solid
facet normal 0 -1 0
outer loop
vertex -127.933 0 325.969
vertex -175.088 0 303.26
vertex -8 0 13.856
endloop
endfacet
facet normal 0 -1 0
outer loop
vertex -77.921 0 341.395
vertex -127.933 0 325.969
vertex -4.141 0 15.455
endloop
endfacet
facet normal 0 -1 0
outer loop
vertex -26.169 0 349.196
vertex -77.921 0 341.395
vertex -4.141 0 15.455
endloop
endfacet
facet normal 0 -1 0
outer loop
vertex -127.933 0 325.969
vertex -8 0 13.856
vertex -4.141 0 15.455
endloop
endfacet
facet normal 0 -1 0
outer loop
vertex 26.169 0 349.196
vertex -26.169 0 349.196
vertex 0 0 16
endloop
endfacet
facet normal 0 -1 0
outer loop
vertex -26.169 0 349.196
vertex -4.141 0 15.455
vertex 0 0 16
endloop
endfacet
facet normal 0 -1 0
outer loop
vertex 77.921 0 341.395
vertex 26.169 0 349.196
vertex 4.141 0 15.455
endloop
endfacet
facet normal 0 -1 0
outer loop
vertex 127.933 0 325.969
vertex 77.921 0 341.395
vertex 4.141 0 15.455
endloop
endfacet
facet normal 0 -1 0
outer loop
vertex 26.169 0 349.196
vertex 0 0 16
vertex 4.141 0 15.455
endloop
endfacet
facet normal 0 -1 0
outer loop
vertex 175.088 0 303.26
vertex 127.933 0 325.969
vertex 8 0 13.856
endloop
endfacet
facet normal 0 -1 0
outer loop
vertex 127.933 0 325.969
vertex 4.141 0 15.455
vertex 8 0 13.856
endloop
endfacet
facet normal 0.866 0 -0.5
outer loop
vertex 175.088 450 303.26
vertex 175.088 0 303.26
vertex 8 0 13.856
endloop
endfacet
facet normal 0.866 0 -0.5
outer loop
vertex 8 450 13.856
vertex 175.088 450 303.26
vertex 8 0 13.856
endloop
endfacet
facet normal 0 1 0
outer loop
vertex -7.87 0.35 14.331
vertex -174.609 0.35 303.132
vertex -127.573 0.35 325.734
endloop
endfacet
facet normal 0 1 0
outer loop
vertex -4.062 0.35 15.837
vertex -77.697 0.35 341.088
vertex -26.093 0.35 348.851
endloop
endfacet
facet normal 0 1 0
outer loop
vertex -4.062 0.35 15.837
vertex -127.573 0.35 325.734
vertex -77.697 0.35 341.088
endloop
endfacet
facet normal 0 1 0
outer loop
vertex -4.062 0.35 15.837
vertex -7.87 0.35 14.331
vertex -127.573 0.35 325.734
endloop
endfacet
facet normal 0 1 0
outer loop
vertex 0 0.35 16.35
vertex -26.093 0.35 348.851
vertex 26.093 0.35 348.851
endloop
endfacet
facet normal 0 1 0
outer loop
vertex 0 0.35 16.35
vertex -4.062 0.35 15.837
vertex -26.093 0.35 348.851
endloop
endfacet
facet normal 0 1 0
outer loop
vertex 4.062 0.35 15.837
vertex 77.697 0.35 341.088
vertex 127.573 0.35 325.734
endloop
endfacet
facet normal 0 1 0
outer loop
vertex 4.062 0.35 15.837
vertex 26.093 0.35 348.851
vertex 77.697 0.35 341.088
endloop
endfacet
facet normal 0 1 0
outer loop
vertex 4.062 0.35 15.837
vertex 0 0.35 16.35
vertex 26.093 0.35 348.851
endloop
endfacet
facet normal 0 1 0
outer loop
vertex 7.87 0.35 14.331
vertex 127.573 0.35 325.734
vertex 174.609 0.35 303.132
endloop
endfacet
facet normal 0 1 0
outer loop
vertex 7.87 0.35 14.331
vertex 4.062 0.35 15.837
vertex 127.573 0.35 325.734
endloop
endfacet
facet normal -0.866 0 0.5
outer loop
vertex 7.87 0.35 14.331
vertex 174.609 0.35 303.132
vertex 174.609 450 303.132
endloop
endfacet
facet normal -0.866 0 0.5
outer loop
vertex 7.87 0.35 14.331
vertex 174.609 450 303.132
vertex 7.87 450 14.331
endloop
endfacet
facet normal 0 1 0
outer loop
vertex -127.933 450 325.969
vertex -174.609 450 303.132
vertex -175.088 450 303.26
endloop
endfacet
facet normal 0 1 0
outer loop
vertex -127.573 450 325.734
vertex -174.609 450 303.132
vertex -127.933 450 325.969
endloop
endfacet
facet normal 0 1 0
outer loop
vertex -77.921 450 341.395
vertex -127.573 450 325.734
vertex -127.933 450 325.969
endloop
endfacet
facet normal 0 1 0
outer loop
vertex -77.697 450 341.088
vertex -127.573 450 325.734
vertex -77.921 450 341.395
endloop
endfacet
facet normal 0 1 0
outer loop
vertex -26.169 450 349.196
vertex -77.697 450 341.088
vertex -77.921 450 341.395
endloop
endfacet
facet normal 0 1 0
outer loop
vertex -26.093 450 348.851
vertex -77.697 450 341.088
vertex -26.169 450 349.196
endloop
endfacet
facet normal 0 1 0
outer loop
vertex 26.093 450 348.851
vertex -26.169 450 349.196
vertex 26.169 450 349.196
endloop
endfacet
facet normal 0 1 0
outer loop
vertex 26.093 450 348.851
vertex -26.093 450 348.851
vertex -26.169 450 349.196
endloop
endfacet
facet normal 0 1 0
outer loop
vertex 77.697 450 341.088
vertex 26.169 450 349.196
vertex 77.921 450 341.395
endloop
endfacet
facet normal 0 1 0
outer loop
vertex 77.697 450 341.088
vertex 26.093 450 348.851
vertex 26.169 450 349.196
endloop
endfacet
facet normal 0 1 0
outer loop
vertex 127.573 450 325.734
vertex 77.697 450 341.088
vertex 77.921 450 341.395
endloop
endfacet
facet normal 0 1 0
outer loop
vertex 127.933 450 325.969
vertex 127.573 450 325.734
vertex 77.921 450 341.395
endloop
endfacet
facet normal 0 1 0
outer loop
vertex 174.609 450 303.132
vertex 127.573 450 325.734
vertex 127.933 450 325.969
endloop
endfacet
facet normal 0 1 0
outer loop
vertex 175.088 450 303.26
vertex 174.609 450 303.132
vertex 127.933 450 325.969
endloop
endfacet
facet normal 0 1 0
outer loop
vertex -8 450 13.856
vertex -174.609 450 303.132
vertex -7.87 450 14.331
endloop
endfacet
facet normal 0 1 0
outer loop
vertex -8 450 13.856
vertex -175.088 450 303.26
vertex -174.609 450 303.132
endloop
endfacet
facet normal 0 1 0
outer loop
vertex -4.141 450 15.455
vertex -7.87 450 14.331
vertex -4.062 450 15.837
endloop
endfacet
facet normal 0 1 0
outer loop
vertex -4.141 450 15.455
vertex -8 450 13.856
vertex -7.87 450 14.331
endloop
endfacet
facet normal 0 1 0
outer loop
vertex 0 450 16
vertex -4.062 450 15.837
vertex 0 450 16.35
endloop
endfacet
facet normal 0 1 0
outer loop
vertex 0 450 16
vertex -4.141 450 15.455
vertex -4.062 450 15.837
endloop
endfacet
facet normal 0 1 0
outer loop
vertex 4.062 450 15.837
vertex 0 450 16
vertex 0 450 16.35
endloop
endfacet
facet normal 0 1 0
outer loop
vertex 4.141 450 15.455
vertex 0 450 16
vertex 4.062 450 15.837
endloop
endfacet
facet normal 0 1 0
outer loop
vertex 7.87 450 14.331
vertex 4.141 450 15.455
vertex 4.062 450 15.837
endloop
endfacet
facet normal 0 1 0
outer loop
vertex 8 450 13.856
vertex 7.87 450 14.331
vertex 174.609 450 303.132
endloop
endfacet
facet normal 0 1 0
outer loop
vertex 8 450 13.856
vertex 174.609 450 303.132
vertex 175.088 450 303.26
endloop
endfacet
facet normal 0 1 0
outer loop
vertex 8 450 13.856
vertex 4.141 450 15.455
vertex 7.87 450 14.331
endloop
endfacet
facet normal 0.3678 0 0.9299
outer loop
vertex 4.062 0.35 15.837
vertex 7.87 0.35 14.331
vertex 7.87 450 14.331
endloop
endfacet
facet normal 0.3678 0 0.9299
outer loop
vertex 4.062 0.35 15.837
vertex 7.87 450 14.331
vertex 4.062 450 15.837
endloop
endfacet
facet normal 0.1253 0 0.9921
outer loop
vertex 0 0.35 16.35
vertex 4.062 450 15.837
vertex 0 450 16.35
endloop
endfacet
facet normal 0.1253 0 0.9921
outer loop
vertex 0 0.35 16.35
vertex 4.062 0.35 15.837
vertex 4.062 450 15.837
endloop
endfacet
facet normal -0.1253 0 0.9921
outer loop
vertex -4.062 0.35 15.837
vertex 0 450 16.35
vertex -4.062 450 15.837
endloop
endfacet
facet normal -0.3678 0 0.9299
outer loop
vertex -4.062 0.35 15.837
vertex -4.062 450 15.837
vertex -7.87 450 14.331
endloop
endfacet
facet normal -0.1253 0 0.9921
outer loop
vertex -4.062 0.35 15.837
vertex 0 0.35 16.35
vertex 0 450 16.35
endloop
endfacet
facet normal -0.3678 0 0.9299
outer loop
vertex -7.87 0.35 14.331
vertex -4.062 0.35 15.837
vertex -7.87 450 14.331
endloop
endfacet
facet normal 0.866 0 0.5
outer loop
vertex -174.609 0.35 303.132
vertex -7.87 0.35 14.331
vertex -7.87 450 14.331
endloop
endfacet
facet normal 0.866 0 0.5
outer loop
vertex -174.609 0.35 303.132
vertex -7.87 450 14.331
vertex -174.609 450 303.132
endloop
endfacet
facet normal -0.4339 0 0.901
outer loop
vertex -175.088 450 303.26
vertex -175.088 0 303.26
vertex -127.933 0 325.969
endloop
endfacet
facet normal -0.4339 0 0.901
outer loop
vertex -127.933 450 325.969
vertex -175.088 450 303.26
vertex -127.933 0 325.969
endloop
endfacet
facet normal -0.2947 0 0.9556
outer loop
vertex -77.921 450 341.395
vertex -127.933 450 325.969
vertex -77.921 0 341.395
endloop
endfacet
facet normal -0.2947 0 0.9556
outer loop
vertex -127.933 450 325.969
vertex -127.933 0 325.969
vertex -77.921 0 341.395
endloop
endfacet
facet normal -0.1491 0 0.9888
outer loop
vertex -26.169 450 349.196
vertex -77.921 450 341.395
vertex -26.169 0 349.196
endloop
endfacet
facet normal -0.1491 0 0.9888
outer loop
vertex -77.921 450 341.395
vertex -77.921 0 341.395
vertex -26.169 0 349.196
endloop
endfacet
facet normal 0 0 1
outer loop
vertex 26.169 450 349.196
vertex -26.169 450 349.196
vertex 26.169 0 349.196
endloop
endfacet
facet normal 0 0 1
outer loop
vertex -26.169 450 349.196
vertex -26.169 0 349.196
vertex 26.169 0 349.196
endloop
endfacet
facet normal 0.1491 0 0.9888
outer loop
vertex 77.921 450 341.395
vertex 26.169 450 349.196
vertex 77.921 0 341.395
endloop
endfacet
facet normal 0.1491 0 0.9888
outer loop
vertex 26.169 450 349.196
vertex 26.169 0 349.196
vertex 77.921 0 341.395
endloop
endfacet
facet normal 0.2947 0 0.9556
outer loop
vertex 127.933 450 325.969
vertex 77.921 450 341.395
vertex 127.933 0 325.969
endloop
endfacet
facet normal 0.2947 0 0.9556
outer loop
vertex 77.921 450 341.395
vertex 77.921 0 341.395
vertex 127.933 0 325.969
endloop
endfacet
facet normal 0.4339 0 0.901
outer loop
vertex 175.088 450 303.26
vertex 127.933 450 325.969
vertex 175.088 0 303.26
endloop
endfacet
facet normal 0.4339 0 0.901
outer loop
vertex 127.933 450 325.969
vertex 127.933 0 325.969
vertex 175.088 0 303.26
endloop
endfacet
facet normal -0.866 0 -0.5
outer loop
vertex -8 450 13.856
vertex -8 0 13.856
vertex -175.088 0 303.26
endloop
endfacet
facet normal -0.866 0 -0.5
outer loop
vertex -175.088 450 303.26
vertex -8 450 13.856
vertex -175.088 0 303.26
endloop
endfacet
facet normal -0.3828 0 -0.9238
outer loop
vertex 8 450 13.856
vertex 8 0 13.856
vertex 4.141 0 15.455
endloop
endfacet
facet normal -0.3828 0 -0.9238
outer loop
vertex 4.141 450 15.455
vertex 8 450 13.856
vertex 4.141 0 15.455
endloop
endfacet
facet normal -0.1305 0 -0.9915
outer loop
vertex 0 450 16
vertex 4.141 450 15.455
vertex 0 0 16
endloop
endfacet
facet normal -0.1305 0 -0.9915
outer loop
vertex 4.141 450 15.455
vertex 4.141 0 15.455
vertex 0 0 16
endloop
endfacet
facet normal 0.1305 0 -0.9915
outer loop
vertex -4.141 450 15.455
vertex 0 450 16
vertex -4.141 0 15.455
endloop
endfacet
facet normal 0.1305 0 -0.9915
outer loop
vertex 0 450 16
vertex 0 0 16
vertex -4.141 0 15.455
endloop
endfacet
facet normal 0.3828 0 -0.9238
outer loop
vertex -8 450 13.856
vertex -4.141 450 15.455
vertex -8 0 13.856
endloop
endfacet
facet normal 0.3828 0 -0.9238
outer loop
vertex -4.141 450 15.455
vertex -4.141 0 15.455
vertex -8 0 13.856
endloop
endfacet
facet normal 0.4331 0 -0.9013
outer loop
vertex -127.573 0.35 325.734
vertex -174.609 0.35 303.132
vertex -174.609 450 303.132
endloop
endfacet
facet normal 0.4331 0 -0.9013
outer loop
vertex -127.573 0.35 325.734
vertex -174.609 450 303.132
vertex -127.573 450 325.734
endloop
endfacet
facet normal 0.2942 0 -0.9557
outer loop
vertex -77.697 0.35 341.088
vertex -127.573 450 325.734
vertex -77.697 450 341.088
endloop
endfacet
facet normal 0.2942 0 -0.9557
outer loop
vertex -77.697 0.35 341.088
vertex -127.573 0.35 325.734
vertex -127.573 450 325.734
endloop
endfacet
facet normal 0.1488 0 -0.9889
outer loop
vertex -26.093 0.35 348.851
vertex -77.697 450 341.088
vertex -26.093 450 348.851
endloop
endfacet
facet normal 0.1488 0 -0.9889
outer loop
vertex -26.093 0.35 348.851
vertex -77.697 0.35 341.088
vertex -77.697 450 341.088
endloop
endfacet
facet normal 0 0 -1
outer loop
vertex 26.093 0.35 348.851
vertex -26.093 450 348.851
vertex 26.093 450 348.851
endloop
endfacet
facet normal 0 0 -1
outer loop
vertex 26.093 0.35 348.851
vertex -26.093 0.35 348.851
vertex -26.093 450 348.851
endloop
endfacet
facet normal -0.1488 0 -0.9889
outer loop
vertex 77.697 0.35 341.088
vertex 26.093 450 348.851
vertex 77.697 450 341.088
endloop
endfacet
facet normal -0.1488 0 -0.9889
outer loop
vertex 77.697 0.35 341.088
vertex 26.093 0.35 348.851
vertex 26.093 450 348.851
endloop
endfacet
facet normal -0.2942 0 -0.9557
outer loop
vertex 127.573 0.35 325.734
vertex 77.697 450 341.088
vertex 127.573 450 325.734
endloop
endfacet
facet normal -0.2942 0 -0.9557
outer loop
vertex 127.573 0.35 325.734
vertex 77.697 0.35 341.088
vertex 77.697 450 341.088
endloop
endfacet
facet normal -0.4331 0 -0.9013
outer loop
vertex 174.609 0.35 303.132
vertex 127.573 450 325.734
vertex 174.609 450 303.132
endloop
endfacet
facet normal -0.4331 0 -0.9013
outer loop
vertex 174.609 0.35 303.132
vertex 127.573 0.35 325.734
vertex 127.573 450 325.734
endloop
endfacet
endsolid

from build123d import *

# Parameters (mm, degrees)
BOSS_EXTRUDE1_DEPTH = 450
SHELL1_T            = -0.35


with BuildPart() as part:
    # Sketch1 → Boss-Extrude1 (new body)
    with BuildSketch(Plane(origin=(0, 0, 0), x_dir=(1, 0, 0), z_dir=(0, 1, 0))):
        with BuildLine():
            Line((-8, -13.856406461), (-175.0875, -303.26044577))
            ThreePointArc((-175.0875, -303.26044577), (0, -350.175), (175.0875, -303.26044577))
            Line((175.0875, -303.26044577), (8, -13.856406461))
            ThreePointArc((8, -13.856406461), (0, -16), (-8, -13.856406461))
        make_face()
    extrude(amount=BOSS_EXTRUDE1_DEPTH)

    # Shell1
    shell1_openings = [part.faces().sort_by_distance(p)[0] for p in [
        (0, 450, 170.822963058),
    ]]
    offset(amount=SHELL1_T, openings=shell1_openings, kind=Kind.INTERSECTION)


solid = part.part
